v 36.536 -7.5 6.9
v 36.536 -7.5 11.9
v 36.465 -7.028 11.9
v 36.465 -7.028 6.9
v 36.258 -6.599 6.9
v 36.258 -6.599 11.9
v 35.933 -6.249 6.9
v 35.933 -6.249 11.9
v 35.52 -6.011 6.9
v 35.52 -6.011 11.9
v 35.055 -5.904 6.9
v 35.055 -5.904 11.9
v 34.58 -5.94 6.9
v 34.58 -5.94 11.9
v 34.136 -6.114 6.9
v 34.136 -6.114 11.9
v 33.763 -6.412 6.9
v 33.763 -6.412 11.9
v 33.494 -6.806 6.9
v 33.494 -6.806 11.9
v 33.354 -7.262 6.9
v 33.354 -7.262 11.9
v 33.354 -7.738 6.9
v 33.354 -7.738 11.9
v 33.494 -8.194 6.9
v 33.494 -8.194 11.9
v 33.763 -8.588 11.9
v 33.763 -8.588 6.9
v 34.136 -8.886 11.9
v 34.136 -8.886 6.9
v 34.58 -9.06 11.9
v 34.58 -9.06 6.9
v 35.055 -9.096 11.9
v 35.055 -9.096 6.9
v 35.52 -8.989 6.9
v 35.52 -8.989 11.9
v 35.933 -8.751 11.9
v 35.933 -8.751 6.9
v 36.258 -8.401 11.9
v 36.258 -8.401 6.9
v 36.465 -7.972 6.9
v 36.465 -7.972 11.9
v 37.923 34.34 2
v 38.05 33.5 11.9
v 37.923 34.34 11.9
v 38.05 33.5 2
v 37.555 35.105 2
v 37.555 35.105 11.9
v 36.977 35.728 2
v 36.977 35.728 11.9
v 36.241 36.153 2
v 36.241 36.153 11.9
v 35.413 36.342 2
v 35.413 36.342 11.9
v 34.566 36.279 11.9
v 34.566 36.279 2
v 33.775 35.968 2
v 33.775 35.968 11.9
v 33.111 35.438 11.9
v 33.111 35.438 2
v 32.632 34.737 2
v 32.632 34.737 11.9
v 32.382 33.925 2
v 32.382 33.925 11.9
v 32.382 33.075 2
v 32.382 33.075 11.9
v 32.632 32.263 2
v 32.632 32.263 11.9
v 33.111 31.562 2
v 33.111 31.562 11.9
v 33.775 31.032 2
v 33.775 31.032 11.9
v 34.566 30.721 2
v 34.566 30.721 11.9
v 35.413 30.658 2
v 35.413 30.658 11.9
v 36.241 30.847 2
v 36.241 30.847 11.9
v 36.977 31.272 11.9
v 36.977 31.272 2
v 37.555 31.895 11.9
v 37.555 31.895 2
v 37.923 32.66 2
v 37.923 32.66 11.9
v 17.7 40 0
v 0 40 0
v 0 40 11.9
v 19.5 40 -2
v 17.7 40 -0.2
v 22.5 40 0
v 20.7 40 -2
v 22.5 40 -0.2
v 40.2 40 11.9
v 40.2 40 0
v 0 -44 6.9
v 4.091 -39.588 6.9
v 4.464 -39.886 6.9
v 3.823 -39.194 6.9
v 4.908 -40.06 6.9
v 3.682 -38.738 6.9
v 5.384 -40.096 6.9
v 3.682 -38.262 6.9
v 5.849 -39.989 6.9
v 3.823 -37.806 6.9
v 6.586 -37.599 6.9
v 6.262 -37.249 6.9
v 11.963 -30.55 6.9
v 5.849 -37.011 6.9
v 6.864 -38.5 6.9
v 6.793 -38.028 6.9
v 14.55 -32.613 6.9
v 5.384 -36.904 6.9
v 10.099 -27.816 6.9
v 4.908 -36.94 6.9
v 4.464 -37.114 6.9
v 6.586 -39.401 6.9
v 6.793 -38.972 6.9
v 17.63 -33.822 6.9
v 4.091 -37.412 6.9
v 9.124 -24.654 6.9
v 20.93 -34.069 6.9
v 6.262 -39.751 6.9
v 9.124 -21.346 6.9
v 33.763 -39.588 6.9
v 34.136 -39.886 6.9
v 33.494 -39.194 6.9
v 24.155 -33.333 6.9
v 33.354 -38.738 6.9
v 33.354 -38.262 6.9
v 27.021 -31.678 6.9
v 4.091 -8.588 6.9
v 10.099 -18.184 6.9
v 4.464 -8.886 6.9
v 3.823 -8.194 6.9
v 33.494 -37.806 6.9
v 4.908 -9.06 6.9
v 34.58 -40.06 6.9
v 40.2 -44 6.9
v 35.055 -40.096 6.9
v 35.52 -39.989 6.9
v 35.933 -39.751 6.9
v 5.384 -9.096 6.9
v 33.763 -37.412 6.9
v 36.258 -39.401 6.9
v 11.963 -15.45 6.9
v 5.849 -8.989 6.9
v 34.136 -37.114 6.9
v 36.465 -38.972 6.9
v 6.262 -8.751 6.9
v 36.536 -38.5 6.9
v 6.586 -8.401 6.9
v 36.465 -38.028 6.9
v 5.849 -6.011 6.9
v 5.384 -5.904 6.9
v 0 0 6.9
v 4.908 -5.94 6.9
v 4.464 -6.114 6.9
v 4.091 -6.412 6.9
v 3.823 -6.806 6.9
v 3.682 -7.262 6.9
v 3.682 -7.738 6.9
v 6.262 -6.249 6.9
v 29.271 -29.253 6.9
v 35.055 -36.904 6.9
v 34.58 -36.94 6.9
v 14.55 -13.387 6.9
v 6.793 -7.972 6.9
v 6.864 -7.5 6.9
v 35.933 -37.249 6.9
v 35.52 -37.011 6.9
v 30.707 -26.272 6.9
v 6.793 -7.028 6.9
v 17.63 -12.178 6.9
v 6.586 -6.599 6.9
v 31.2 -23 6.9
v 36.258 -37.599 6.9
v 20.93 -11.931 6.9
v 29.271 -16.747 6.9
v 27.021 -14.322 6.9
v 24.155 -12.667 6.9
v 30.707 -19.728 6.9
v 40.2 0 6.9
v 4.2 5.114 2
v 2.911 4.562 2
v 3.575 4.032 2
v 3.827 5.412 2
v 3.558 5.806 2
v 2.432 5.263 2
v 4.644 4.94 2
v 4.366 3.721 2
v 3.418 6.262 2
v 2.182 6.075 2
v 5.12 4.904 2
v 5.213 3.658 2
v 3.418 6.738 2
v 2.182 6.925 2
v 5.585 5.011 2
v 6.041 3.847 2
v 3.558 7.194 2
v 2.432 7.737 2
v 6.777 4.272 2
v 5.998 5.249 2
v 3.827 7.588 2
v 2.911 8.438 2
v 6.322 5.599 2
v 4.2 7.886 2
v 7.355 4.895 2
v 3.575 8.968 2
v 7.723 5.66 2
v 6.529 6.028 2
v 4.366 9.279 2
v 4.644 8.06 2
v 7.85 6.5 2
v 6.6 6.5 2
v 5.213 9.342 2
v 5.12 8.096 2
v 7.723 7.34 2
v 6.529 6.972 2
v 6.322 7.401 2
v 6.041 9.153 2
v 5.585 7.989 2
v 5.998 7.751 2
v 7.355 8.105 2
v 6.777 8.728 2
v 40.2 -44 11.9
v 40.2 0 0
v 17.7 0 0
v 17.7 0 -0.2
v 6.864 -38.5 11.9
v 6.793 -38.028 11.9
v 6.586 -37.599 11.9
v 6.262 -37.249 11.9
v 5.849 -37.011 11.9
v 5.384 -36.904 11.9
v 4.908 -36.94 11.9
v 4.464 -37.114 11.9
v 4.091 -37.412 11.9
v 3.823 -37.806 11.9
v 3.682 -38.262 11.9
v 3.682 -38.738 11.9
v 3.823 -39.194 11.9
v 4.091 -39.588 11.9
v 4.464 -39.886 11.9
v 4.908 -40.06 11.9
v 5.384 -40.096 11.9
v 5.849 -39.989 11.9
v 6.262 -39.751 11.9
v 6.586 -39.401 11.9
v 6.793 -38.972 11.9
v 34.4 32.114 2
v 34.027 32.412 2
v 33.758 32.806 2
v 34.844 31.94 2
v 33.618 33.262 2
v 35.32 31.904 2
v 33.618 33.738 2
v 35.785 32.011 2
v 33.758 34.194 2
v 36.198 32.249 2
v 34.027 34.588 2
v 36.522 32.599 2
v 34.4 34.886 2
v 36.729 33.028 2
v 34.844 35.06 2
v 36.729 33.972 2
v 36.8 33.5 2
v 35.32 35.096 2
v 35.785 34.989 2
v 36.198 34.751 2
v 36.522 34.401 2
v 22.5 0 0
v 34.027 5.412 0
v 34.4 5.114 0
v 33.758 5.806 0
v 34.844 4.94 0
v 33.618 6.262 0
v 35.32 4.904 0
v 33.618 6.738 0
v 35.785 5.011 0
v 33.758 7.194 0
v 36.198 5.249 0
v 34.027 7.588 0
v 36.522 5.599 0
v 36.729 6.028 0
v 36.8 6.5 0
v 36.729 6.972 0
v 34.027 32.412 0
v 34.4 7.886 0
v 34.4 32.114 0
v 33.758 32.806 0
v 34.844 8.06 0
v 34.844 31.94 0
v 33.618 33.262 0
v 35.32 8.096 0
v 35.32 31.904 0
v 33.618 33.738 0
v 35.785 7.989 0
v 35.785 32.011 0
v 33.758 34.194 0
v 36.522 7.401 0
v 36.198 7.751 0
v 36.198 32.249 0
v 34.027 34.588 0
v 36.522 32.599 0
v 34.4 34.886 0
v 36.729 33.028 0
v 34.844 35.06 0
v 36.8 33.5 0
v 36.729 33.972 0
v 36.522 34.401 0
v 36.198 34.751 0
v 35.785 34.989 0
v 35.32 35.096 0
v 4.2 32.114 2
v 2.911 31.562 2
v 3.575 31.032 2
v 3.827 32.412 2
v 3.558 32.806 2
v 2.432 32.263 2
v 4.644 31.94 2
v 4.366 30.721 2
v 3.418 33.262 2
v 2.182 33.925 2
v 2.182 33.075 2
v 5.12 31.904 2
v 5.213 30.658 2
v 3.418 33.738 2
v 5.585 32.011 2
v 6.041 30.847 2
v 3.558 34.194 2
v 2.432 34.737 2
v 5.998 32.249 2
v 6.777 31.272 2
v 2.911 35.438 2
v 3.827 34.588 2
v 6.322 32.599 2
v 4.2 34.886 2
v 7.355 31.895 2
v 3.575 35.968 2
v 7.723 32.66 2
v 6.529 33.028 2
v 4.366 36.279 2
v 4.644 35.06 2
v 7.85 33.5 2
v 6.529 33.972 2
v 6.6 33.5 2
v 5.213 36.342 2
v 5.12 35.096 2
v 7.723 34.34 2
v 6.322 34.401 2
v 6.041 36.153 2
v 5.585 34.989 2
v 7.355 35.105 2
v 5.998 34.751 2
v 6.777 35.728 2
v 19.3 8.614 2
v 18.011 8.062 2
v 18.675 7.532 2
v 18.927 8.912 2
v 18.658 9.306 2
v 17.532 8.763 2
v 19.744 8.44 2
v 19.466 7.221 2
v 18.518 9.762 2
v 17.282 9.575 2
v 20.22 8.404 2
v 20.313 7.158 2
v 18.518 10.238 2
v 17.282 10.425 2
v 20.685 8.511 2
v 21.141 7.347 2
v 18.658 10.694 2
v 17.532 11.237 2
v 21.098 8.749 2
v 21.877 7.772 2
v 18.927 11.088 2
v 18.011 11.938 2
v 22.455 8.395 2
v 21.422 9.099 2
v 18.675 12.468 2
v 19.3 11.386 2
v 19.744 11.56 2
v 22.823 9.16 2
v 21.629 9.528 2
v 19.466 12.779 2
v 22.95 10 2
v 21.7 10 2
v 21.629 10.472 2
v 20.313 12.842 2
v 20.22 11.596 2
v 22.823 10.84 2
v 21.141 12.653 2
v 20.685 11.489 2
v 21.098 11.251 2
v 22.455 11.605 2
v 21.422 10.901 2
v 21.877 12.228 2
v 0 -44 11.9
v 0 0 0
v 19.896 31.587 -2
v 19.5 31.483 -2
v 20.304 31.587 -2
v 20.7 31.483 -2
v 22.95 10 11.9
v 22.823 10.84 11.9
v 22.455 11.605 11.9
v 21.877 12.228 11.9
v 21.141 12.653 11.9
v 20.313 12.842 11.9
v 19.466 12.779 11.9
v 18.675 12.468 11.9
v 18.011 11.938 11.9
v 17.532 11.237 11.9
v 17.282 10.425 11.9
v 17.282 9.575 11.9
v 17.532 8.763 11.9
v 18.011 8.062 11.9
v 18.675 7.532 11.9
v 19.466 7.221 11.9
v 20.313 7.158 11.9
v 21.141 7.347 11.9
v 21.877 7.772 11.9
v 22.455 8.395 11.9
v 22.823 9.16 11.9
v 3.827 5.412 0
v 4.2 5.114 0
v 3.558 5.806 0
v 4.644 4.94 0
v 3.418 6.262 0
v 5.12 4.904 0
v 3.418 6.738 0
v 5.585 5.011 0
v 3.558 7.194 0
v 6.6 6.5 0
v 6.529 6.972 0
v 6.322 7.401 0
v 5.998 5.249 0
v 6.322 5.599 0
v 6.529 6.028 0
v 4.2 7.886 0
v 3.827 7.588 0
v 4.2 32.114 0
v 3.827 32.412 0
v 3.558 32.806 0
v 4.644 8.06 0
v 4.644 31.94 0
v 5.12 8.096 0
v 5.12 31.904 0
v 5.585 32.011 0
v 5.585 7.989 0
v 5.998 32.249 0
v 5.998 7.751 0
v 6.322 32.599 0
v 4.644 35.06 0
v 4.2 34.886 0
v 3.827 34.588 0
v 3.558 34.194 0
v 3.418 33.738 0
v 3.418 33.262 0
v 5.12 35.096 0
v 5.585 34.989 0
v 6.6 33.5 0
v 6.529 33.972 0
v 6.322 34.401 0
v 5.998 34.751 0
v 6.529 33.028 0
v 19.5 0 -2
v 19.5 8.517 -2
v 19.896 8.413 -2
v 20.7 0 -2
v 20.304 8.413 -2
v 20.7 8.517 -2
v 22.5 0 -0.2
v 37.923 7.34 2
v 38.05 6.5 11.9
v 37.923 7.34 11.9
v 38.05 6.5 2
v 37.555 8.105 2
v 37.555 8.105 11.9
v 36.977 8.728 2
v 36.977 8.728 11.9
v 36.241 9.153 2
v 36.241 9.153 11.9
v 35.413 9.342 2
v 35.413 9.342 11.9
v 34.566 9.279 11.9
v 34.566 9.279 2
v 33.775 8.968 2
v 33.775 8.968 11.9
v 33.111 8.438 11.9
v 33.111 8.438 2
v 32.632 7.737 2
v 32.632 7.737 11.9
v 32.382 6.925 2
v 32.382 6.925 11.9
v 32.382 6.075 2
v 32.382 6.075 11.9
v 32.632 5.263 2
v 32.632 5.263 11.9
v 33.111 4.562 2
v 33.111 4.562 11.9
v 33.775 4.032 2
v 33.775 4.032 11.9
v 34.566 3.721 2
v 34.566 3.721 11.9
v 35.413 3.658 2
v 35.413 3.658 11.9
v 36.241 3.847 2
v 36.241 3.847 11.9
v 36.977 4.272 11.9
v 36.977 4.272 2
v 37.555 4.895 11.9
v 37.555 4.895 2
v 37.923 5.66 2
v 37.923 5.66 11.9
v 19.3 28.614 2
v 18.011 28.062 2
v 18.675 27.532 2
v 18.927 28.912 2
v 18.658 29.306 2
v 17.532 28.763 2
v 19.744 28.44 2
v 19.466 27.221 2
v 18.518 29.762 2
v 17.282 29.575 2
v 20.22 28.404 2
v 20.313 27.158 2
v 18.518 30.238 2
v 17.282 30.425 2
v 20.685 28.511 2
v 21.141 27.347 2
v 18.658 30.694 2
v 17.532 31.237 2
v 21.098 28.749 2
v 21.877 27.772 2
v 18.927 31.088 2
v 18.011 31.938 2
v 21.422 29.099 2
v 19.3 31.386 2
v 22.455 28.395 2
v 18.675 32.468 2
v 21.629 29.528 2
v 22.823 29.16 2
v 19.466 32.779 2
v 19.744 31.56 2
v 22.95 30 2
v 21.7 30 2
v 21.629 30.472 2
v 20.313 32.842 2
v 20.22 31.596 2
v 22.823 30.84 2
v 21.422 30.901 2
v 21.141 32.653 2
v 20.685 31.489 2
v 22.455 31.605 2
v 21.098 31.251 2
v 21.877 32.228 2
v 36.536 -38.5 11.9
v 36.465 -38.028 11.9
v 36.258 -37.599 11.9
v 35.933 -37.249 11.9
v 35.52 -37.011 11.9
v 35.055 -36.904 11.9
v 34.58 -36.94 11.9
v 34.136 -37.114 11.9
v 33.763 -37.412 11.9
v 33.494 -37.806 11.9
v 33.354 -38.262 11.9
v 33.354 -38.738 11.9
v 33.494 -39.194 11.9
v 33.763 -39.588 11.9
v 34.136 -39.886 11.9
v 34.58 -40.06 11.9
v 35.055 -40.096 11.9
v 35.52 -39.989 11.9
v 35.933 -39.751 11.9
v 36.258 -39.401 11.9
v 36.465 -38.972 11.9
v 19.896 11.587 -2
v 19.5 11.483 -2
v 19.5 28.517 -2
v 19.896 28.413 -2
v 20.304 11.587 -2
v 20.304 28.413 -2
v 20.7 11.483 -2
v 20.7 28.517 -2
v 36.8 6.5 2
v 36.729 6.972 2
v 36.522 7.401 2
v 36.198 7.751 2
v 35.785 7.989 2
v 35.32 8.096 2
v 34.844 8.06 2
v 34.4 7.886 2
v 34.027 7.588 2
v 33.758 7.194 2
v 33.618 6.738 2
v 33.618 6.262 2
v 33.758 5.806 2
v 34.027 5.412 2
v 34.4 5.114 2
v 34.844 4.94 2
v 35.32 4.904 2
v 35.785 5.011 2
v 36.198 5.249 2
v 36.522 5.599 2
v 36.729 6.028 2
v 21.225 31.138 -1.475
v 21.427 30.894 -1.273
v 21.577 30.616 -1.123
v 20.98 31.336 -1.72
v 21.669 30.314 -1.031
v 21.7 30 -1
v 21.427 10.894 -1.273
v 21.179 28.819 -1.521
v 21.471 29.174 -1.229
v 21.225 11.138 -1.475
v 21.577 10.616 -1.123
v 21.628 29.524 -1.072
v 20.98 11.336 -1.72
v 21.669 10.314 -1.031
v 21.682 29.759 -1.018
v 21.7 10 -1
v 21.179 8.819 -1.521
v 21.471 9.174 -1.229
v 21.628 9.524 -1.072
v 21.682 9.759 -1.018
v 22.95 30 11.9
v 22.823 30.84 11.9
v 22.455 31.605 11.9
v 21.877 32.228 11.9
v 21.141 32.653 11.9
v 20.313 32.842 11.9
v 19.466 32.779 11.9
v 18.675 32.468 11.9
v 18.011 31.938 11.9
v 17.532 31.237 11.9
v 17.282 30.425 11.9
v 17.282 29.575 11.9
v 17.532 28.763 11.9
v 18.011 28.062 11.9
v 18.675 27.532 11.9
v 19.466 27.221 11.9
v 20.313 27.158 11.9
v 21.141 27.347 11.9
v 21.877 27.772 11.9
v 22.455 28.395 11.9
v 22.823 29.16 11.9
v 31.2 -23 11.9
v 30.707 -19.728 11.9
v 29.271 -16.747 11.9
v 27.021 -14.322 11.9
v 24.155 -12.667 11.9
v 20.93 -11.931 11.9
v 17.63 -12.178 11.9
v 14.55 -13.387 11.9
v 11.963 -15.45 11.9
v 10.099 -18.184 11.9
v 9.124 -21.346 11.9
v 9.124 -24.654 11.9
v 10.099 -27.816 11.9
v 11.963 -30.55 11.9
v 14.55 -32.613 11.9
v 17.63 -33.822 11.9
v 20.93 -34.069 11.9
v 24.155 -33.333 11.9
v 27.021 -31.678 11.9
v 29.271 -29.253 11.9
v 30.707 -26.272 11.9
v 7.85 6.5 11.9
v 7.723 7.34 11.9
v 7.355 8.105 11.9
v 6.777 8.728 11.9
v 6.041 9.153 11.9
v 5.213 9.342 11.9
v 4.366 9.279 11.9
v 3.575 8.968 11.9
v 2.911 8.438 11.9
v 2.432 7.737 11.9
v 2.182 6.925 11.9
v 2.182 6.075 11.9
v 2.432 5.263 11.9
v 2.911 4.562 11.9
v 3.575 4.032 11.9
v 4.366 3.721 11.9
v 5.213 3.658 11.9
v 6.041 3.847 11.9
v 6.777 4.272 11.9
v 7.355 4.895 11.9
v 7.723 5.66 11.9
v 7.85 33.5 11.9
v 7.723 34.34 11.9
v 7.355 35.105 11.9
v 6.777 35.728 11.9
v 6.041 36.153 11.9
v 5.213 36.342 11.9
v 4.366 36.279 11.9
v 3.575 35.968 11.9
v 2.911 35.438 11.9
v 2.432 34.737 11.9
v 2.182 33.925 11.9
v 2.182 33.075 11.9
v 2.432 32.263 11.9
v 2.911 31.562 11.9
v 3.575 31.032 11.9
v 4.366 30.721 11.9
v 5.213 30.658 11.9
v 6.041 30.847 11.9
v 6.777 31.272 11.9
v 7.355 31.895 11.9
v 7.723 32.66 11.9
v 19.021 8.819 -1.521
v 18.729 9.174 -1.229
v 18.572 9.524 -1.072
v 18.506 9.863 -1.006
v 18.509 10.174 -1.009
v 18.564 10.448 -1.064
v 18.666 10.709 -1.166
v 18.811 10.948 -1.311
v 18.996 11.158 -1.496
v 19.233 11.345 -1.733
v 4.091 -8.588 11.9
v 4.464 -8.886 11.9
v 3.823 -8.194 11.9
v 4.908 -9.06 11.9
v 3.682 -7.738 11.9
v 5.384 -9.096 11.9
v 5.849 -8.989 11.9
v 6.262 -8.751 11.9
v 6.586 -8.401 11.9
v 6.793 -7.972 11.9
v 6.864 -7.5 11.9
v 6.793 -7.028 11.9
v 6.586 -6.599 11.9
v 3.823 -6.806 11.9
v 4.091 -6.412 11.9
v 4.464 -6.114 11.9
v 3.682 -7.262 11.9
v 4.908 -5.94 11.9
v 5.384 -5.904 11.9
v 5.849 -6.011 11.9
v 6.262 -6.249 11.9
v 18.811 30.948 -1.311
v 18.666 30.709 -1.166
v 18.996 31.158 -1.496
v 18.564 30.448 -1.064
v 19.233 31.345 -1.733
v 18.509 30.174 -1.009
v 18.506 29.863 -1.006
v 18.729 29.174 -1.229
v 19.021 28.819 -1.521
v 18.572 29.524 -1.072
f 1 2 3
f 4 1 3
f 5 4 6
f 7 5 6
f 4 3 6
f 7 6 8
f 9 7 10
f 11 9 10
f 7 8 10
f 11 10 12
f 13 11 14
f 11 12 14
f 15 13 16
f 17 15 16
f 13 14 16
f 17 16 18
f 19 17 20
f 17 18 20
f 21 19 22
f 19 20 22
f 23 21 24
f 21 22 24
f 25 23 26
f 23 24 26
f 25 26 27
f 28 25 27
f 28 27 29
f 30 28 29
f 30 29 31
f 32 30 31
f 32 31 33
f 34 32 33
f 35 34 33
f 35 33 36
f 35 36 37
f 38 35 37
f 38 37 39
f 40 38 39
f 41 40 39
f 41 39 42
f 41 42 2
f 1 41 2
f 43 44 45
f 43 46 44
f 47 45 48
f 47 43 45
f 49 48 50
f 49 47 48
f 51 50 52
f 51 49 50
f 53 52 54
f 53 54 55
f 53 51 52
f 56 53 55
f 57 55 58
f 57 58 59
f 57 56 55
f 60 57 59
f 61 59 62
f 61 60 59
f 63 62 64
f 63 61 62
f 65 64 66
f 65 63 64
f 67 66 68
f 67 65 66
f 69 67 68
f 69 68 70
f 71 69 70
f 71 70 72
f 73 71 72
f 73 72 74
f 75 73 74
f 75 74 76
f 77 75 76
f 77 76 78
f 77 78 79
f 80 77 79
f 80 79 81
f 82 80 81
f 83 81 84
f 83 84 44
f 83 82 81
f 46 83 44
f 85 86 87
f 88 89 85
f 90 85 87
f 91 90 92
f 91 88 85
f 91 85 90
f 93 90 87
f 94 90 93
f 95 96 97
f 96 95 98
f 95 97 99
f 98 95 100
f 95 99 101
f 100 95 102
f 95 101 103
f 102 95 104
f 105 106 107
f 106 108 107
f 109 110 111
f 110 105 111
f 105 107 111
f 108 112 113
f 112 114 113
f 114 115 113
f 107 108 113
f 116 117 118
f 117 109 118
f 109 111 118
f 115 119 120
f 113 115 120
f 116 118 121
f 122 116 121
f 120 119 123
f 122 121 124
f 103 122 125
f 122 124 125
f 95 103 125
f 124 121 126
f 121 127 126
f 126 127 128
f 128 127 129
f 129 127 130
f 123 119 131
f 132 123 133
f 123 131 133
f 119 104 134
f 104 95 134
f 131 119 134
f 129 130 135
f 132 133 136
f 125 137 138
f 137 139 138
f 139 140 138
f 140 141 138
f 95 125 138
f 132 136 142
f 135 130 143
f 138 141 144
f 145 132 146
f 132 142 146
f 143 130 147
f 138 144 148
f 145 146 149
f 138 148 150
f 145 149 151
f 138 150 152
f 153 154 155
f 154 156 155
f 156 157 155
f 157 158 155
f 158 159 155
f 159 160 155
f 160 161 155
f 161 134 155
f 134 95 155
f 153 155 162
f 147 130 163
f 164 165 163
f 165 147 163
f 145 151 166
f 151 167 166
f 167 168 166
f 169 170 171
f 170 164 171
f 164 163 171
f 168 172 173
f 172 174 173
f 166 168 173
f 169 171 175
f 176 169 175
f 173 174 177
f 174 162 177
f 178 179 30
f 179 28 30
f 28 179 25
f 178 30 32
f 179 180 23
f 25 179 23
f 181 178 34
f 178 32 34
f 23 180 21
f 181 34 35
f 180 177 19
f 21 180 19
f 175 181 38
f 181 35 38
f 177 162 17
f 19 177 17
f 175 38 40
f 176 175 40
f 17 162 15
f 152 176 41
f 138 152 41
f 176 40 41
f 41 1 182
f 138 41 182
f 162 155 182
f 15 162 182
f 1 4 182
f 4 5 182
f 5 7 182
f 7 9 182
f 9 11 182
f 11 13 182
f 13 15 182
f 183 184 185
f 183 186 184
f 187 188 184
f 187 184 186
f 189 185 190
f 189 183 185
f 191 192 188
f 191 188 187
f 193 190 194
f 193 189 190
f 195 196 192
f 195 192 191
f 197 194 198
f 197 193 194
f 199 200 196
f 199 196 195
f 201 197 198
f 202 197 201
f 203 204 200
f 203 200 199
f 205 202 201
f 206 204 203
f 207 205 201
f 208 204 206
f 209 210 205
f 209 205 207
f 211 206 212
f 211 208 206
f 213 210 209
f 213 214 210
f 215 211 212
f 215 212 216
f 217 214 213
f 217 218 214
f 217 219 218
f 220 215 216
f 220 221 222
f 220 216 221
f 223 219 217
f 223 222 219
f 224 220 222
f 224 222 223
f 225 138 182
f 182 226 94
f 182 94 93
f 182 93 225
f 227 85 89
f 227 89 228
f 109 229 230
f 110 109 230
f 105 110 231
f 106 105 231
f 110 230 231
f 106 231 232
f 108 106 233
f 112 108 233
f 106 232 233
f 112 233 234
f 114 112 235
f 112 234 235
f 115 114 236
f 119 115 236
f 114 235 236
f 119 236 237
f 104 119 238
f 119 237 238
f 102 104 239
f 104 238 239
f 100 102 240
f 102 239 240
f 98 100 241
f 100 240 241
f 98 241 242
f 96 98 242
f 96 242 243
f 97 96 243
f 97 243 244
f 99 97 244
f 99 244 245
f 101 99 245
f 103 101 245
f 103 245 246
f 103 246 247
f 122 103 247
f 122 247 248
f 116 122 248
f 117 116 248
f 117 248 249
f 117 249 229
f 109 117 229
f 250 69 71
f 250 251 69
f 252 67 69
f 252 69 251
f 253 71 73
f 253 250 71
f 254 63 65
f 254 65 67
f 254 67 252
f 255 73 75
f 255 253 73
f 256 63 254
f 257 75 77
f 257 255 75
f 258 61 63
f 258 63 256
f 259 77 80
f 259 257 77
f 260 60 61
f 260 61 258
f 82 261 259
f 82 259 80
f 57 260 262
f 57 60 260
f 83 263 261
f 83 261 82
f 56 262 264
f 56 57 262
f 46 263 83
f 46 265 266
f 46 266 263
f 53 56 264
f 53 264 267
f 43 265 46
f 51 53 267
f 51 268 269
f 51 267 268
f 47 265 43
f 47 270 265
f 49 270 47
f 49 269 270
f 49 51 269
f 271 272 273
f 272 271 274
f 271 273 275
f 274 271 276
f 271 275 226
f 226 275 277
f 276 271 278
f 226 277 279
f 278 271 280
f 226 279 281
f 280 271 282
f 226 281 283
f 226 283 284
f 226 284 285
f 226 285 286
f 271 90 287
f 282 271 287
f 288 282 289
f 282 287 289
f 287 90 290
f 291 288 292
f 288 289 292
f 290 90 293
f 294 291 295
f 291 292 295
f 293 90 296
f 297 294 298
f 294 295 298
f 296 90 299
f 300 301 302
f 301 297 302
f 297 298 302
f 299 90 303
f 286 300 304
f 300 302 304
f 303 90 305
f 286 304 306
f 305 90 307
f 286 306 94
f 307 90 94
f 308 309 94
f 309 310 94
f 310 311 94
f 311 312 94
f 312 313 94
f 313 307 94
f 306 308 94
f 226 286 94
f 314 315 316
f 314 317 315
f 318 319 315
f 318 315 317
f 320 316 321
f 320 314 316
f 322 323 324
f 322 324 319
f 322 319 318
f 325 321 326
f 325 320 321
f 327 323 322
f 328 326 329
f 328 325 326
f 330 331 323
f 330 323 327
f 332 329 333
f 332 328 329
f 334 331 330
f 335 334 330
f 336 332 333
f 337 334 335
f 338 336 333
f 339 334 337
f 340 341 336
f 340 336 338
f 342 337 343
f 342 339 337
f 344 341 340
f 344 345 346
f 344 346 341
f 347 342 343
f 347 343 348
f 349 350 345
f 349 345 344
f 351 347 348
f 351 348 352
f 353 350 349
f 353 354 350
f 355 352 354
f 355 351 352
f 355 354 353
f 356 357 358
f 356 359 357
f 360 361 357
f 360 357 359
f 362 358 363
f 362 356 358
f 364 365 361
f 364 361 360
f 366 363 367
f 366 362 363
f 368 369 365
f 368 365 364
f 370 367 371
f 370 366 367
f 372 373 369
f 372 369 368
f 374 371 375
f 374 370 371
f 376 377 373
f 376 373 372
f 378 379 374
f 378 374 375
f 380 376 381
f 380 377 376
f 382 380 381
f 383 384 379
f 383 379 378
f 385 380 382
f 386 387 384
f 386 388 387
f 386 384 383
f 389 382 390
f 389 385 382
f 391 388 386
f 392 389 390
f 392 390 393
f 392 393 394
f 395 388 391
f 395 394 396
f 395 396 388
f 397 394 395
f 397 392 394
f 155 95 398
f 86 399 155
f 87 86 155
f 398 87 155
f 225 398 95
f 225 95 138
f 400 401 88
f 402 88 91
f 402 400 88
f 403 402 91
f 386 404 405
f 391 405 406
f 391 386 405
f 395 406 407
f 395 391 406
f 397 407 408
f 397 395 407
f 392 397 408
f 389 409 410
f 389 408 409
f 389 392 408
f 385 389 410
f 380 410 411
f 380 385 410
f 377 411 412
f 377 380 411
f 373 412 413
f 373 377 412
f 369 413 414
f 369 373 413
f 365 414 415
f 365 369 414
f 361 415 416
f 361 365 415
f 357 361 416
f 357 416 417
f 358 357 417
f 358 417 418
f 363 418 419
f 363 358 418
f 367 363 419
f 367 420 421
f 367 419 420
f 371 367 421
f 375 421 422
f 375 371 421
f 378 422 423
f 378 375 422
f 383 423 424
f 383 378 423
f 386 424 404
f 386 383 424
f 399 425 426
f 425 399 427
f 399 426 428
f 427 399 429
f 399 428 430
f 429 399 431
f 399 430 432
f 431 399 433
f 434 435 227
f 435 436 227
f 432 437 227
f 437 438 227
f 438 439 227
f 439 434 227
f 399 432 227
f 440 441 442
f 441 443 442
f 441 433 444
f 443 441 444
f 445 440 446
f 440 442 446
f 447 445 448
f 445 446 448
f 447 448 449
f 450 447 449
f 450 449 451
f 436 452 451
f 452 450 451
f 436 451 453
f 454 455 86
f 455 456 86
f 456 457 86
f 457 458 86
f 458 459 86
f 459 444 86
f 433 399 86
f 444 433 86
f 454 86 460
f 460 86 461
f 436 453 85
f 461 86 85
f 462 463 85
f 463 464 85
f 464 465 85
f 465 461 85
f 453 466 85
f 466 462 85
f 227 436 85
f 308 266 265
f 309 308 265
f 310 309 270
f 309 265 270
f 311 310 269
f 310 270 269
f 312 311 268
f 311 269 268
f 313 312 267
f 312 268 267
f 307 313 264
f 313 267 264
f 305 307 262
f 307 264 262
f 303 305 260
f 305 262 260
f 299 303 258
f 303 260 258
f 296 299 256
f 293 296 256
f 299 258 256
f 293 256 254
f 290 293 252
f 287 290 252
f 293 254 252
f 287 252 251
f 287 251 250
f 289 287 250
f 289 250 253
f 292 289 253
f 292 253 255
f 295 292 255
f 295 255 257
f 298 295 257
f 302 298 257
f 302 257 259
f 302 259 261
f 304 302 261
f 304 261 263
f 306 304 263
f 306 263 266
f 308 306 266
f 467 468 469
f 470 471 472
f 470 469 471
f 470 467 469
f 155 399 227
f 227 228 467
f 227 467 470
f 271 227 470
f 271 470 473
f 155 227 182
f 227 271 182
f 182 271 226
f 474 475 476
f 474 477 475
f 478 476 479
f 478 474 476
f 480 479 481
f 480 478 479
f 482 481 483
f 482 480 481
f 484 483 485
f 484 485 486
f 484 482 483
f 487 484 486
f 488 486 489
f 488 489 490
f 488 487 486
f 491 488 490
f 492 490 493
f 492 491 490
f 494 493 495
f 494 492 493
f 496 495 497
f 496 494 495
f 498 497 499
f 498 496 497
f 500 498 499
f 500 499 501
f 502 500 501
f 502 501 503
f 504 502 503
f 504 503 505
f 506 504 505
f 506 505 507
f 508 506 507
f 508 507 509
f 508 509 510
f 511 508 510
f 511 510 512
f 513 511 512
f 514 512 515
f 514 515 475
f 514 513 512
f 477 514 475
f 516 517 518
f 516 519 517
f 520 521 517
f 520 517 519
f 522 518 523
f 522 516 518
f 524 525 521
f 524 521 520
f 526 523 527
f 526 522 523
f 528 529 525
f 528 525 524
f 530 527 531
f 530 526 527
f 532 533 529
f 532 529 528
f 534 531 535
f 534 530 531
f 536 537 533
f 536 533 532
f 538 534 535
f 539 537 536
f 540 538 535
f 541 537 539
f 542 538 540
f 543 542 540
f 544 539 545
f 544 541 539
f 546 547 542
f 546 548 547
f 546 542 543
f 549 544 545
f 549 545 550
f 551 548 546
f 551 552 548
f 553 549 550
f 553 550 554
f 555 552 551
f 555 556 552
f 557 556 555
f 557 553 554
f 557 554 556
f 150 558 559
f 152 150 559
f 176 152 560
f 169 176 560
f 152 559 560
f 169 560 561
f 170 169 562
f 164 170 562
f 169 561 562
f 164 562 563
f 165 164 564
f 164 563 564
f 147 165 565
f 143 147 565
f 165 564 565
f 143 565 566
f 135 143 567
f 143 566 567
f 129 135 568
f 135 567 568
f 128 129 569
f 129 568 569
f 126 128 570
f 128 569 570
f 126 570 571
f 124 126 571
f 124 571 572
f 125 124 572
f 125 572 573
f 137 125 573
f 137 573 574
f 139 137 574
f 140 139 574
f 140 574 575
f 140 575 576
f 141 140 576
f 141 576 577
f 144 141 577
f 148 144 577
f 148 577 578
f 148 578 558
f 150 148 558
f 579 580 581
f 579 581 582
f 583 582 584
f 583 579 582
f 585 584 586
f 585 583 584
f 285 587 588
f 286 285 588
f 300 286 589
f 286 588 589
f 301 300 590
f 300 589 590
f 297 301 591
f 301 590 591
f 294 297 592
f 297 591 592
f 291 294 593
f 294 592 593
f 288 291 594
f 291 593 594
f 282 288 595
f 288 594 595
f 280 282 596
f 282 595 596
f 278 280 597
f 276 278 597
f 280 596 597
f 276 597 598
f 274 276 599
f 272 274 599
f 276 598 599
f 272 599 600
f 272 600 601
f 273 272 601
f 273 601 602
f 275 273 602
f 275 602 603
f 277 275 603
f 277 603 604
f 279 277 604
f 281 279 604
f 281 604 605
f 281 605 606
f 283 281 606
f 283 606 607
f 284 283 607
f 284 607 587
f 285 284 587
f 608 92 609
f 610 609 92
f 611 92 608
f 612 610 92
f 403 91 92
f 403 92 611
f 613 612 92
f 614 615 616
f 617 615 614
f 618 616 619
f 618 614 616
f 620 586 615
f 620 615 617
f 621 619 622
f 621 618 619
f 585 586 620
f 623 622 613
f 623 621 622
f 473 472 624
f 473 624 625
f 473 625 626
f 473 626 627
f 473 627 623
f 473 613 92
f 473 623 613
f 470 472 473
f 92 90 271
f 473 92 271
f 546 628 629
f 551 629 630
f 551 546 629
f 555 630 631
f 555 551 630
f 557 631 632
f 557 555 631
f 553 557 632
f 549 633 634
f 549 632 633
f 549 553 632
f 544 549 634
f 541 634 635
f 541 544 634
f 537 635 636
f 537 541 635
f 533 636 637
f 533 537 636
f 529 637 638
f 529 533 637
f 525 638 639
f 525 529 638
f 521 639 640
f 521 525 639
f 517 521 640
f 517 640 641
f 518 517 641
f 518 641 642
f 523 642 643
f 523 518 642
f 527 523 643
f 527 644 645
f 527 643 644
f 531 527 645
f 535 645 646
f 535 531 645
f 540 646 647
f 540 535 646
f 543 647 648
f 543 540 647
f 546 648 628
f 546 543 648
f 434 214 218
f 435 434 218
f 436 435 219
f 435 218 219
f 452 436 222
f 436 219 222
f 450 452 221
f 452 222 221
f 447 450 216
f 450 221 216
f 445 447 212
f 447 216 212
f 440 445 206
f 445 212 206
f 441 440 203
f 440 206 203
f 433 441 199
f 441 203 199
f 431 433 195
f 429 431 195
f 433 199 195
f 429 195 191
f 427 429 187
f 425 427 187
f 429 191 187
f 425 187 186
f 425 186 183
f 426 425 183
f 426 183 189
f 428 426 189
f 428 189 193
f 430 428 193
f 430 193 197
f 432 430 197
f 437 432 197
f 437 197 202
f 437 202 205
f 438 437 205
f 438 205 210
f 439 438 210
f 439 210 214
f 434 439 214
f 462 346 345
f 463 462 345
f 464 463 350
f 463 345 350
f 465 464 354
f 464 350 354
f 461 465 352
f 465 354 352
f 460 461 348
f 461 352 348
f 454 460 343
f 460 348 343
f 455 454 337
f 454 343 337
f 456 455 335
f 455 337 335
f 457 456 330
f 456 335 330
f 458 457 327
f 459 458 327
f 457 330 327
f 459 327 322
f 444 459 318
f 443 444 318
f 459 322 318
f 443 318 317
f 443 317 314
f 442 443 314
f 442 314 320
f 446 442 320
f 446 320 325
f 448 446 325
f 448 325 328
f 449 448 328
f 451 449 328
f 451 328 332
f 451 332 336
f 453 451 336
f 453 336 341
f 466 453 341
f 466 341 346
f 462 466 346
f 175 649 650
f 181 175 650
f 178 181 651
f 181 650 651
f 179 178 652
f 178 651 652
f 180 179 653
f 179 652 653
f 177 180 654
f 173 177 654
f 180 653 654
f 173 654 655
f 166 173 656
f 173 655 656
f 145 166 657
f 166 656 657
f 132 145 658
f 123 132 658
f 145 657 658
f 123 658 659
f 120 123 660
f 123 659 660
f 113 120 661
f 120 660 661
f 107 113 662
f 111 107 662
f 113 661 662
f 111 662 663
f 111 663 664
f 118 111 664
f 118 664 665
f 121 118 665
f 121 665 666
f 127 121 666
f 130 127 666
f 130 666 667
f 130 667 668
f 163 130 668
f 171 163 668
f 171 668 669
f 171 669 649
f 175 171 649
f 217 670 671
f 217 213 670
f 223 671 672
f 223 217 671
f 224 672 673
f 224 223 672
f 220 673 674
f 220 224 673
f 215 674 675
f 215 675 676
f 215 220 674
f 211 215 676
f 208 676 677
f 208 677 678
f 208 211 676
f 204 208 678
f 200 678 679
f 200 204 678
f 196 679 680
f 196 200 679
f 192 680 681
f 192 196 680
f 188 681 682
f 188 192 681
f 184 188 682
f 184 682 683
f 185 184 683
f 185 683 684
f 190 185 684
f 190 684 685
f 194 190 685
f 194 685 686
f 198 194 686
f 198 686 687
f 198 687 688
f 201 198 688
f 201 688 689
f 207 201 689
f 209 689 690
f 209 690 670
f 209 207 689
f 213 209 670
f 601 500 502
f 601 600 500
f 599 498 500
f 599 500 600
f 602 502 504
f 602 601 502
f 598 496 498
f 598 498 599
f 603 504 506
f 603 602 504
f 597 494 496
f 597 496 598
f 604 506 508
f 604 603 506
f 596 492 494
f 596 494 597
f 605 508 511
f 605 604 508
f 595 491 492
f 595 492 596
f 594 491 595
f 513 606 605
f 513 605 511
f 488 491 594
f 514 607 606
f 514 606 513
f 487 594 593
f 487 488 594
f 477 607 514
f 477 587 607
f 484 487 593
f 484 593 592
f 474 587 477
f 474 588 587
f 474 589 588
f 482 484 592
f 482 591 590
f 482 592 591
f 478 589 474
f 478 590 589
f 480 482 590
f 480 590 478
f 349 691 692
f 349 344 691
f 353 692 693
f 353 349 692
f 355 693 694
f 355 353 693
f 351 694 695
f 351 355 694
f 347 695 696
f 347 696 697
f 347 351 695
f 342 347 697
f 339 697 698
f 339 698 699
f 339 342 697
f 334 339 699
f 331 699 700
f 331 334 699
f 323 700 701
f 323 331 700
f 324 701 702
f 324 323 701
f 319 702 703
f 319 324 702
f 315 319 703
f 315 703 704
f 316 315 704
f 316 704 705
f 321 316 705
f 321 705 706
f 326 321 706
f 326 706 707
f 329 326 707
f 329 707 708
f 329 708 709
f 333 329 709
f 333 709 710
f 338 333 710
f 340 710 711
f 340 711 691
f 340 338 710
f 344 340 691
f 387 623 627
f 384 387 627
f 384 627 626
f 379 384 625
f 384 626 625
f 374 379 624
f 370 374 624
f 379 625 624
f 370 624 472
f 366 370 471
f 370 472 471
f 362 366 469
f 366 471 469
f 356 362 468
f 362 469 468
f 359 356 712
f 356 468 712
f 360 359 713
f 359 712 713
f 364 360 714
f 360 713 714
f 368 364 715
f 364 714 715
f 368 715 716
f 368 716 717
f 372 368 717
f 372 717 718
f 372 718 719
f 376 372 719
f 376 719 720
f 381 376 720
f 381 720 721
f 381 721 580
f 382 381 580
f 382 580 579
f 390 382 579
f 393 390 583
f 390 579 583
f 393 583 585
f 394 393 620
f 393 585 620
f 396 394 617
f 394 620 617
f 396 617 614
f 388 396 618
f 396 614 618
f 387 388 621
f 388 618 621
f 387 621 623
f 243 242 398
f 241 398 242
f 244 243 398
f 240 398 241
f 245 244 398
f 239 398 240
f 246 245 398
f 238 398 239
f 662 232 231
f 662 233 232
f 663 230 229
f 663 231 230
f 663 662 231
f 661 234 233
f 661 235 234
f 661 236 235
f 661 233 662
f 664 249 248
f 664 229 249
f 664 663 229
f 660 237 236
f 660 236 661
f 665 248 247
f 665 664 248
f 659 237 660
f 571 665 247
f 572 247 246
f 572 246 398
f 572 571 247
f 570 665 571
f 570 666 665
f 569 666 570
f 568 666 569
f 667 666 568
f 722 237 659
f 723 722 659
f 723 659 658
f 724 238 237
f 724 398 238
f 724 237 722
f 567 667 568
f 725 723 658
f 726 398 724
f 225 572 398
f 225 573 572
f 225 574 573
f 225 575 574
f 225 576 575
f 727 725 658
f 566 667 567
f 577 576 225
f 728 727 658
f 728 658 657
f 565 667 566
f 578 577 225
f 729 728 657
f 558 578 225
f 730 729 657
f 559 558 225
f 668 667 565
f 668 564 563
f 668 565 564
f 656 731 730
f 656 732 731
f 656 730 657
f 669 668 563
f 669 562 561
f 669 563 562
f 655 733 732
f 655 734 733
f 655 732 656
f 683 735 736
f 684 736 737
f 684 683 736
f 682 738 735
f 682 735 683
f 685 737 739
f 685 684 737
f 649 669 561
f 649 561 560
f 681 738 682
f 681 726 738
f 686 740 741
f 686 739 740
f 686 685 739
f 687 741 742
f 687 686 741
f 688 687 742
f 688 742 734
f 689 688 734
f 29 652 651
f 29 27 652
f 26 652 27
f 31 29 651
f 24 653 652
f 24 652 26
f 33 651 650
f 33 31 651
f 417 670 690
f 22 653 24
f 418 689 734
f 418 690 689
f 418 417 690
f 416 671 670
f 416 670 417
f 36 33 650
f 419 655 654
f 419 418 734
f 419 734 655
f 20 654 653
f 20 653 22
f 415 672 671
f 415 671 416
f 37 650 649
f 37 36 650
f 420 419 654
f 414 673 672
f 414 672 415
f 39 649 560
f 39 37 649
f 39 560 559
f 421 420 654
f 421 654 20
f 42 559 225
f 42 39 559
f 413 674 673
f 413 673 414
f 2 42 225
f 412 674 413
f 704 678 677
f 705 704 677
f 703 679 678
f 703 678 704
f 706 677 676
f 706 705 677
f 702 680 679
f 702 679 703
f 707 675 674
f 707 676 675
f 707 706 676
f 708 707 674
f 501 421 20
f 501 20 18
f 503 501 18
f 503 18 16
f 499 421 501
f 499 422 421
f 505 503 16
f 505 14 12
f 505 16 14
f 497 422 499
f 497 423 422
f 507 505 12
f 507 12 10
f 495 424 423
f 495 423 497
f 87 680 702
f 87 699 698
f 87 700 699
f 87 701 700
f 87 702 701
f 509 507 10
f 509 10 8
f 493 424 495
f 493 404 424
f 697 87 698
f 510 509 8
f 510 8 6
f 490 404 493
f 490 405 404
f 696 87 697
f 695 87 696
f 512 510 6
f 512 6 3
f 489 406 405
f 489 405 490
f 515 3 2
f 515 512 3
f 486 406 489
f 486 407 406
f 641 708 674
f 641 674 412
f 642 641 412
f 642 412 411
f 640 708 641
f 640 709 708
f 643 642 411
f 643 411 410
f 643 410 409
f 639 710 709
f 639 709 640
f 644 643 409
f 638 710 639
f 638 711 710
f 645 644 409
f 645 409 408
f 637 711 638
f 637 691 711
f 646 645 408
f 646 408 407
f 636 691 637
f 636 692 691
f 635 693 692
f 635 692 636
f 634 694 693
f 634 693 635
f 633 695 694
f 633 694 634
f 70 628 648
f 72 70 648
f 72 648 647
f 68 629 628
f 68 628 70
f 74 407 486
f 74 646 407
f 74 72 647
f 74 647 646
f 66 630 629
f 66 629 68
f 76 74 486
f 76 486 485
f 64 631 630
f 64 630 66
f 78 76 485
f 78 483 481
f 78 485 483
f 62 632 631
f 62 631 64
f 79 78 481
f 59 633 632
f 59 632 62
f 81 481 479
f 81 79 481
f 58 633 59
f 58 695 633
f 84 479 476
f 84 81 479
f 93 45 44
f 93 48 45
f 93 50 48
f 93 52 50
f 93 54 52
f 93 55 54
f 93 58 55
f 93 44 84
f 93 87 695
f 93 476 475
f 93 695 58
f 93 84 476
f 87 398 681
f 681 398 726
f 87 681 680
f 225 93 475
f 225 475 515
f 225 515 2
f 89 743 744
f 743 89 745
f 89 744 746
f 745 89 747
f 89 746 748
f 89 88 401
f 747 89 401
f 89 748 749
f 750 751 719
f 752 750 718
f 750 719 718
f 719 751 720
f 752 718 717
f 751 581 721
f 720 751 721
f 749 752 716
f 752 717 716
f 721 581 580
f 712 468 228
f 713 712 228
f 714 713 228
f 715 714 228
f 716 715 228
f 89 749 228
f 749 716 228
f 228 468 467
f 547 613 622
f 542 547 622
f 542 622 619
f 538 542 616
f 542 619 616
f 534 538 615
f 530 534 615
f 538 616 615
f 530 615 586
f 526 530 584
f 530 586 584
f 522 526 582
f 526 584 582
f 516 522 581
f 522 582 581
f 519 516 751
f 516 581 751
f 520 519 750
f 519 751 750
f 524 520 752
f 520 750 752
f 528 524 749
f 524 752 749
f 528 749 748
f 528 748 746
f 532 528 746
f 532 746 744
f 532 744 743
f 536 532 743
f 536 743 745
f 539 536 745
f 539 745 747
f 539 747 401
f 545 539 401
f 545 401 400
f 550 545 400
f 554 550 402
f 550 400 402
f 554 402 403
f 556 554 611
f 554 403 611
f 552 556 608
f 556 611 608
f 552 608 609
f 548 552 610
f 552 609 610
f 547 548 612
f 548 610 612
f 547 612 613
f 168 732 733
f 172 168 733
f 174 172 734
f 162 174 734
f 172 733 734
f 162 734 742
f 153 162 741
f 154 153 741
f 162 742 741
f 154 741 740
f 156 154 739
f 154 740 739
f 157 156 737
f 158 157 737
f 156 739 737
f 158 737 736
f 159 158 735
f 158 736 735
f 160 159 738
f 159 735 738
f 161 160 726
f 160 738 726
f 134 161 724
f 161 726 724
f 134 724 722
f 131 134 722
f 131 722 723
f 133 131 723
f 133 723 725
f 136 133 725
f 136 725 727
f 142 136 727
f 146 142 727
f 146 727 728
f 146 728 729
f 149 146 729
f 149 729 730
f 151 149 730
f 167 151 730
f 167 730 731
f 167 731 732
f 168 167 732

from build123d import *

# Parameters (mm, degrees)
F0_W      = 40.2
F0_H      = 40
F1_DEPTH  = 5.5
F2_R      = 2.85
F3_DEPTH  = 3.5
F4_R      = 1.6
F5_DEPTH  = 25
F6_W      = 4.8
F6_H      = 40
F7_DEPTH  = 2
F8_SIZE   = 1.8
F9_R      = 1.6
F10_DEPTH = 25
F11_R     = 2.85
F12_DEPTH = 3.5
F2_W      = 40.2
F2_H      = 40
F13_DEPTH = 6.4
F14_DEPTH = 25
F15_W     = 40.2
F15_H     = 5
F16_DEPTH = 44
F17_R     = 11.1
F17_R_2   = 1.6
F18_DEPTH = 25


with BuildPart() as f1:
    # F0 (on Top) → F1 (new body)
    with BuildSketch(Plane.XY):
        with Locations((20.1, 20)):
            Rectangle(F0_W, F0_H)
    extrude(amount=F1_DEPTH)

    # F2 (on face) → F3 (cut)
    with BuildSketch(Plane.XY.offset(5.5)):
        with Locations((35.2, 6.5)):
            Circle(F2_R)
        with Locations((35.2, 33.5)):
            Circle(F2_R)
        with Locations((5, 33.5)):
            Circle(F2_R)
        with Locations((5, 6.5)):
            Circle(F2_R)
    extrude(amount=-F3_DEPTH, mode=Mode.SUBTRACT)

    # F4 (on face) → F5 (cut)
    with BuildSketch(Plane.XY.offset(5.5)):
        with Locations((35.2, 33.5)):
            Circle(F4_R)
        with Locations((35.2, 6.5)):
            Circle(F4_R)
        with Locations((5, 33.5)):
            Circle(F4_R)
        with Locations((5, 6.5)):
            Circle(F4_R)
    extrude(amount=-F5_DEPTH, mode=Mode.SUBTRACT)

    # F6 (on face) → F7 (join)
    with BuildSketch(Plane(origin=(0, 0, 0), x_dir=(1, 0, 0), z_dir=(0, 0, -1))):
        with Locations((20.1, -20)):
            Rectangle(F6_W, F6_H)
    extrude(amount=F7_DEPTH)

    # F8
    f8_edges = [f1.edges().sort_by_distance(p)[0] for p in [
        (17.7, 20, -2),
        (22.5, 20, -2),
    ]]
    chamfer(f8_edges, length=F8_SIZE)

    # F9 (on face) → F10 (cut)
    with BuildSketch(Plane(origin=(0, 0, -2), x_dir=(1, 0, 0), z_dir=(0, 0, -1))):
        with Locations((20.1, -30)):
            Circle(F9_R)
        with Locations((20.1, -10)):
            Circle(F9_R)
    extrude(amount=-F10_DEPTH, mode=Mode.SUBTRACT)

    # F11 (on face) → F12 (cut)
    with BuildSketch(Plane.XY.offset(5.5)):
        with Locations((20.1, 30)):
            Circle(F11_R)
        with Locations((20.1, 10)):
            Circle(F11_R)
    extrude(amount=-F12_DEPTH, mode=Mode.SUBTRACT)

    # F2 (on face) → F13 (join)
    with BuildSketch(Plane.XY.offset(5.5)):
        with Locations((20.1, 20)):
            Rectangle(F2_W, F2_H)
        with Locations((5, 6.5)):
            Circle(F2_R, mode=Mode.SUBTRACT)
        with Locations((35.2, 6.5)):
            Circle(F2_R, mode=Mode.SUBTRACT)
        with Locations((5, 33.5)):
            Circle(F2_R, mode=Mode.SUBTRACT)
        with Locations((35.2, 33.5)):
            Circle(F2_R, mode=Mode.SUBTRACT)
    extrude(amount=F13_DEPTH)

    # F11 (on face) → F14 (cut)
    with BuildSketch(Plane.XY.offset(5.5)):
        with Locations((20.1, 30)):
            Circle(F11_R)
        with Locations((20.1, 10)):
            Circle(F11_R)
    extrude(amount=F14_DEPTH, mode=Mode.SUBTRACT)

    # F15 (on face) → F16 (join)
    with BuildSketch(Plane.XZ):
        with Locations((20.1, 9.4)):
            Rectangle(F15_W, F15_H)
    extrude(amount=F16_DEPTH)

    # F17 (on face) → F18 (cut)
    with BuildSketch(Plane.XY.offset(11.9)):
        with Locations((20.1, -23)):
            Circle(F17_R)
        with Locations((5.264286, -38.5)):
            Circle(F17_R_2)
        with Locations((34.935714, -38.5)):
            Circle(F17_R_2)
        with Locations((5.264286, -7.5)):
            Circle(F17_R_2)
        with Locations((34.935714, -7.5)):
            Circle(F17_R_2)
    extrude(amount=-F18_DEPTH, mode=Mode.SUBTRACT)


solid = f1.part
